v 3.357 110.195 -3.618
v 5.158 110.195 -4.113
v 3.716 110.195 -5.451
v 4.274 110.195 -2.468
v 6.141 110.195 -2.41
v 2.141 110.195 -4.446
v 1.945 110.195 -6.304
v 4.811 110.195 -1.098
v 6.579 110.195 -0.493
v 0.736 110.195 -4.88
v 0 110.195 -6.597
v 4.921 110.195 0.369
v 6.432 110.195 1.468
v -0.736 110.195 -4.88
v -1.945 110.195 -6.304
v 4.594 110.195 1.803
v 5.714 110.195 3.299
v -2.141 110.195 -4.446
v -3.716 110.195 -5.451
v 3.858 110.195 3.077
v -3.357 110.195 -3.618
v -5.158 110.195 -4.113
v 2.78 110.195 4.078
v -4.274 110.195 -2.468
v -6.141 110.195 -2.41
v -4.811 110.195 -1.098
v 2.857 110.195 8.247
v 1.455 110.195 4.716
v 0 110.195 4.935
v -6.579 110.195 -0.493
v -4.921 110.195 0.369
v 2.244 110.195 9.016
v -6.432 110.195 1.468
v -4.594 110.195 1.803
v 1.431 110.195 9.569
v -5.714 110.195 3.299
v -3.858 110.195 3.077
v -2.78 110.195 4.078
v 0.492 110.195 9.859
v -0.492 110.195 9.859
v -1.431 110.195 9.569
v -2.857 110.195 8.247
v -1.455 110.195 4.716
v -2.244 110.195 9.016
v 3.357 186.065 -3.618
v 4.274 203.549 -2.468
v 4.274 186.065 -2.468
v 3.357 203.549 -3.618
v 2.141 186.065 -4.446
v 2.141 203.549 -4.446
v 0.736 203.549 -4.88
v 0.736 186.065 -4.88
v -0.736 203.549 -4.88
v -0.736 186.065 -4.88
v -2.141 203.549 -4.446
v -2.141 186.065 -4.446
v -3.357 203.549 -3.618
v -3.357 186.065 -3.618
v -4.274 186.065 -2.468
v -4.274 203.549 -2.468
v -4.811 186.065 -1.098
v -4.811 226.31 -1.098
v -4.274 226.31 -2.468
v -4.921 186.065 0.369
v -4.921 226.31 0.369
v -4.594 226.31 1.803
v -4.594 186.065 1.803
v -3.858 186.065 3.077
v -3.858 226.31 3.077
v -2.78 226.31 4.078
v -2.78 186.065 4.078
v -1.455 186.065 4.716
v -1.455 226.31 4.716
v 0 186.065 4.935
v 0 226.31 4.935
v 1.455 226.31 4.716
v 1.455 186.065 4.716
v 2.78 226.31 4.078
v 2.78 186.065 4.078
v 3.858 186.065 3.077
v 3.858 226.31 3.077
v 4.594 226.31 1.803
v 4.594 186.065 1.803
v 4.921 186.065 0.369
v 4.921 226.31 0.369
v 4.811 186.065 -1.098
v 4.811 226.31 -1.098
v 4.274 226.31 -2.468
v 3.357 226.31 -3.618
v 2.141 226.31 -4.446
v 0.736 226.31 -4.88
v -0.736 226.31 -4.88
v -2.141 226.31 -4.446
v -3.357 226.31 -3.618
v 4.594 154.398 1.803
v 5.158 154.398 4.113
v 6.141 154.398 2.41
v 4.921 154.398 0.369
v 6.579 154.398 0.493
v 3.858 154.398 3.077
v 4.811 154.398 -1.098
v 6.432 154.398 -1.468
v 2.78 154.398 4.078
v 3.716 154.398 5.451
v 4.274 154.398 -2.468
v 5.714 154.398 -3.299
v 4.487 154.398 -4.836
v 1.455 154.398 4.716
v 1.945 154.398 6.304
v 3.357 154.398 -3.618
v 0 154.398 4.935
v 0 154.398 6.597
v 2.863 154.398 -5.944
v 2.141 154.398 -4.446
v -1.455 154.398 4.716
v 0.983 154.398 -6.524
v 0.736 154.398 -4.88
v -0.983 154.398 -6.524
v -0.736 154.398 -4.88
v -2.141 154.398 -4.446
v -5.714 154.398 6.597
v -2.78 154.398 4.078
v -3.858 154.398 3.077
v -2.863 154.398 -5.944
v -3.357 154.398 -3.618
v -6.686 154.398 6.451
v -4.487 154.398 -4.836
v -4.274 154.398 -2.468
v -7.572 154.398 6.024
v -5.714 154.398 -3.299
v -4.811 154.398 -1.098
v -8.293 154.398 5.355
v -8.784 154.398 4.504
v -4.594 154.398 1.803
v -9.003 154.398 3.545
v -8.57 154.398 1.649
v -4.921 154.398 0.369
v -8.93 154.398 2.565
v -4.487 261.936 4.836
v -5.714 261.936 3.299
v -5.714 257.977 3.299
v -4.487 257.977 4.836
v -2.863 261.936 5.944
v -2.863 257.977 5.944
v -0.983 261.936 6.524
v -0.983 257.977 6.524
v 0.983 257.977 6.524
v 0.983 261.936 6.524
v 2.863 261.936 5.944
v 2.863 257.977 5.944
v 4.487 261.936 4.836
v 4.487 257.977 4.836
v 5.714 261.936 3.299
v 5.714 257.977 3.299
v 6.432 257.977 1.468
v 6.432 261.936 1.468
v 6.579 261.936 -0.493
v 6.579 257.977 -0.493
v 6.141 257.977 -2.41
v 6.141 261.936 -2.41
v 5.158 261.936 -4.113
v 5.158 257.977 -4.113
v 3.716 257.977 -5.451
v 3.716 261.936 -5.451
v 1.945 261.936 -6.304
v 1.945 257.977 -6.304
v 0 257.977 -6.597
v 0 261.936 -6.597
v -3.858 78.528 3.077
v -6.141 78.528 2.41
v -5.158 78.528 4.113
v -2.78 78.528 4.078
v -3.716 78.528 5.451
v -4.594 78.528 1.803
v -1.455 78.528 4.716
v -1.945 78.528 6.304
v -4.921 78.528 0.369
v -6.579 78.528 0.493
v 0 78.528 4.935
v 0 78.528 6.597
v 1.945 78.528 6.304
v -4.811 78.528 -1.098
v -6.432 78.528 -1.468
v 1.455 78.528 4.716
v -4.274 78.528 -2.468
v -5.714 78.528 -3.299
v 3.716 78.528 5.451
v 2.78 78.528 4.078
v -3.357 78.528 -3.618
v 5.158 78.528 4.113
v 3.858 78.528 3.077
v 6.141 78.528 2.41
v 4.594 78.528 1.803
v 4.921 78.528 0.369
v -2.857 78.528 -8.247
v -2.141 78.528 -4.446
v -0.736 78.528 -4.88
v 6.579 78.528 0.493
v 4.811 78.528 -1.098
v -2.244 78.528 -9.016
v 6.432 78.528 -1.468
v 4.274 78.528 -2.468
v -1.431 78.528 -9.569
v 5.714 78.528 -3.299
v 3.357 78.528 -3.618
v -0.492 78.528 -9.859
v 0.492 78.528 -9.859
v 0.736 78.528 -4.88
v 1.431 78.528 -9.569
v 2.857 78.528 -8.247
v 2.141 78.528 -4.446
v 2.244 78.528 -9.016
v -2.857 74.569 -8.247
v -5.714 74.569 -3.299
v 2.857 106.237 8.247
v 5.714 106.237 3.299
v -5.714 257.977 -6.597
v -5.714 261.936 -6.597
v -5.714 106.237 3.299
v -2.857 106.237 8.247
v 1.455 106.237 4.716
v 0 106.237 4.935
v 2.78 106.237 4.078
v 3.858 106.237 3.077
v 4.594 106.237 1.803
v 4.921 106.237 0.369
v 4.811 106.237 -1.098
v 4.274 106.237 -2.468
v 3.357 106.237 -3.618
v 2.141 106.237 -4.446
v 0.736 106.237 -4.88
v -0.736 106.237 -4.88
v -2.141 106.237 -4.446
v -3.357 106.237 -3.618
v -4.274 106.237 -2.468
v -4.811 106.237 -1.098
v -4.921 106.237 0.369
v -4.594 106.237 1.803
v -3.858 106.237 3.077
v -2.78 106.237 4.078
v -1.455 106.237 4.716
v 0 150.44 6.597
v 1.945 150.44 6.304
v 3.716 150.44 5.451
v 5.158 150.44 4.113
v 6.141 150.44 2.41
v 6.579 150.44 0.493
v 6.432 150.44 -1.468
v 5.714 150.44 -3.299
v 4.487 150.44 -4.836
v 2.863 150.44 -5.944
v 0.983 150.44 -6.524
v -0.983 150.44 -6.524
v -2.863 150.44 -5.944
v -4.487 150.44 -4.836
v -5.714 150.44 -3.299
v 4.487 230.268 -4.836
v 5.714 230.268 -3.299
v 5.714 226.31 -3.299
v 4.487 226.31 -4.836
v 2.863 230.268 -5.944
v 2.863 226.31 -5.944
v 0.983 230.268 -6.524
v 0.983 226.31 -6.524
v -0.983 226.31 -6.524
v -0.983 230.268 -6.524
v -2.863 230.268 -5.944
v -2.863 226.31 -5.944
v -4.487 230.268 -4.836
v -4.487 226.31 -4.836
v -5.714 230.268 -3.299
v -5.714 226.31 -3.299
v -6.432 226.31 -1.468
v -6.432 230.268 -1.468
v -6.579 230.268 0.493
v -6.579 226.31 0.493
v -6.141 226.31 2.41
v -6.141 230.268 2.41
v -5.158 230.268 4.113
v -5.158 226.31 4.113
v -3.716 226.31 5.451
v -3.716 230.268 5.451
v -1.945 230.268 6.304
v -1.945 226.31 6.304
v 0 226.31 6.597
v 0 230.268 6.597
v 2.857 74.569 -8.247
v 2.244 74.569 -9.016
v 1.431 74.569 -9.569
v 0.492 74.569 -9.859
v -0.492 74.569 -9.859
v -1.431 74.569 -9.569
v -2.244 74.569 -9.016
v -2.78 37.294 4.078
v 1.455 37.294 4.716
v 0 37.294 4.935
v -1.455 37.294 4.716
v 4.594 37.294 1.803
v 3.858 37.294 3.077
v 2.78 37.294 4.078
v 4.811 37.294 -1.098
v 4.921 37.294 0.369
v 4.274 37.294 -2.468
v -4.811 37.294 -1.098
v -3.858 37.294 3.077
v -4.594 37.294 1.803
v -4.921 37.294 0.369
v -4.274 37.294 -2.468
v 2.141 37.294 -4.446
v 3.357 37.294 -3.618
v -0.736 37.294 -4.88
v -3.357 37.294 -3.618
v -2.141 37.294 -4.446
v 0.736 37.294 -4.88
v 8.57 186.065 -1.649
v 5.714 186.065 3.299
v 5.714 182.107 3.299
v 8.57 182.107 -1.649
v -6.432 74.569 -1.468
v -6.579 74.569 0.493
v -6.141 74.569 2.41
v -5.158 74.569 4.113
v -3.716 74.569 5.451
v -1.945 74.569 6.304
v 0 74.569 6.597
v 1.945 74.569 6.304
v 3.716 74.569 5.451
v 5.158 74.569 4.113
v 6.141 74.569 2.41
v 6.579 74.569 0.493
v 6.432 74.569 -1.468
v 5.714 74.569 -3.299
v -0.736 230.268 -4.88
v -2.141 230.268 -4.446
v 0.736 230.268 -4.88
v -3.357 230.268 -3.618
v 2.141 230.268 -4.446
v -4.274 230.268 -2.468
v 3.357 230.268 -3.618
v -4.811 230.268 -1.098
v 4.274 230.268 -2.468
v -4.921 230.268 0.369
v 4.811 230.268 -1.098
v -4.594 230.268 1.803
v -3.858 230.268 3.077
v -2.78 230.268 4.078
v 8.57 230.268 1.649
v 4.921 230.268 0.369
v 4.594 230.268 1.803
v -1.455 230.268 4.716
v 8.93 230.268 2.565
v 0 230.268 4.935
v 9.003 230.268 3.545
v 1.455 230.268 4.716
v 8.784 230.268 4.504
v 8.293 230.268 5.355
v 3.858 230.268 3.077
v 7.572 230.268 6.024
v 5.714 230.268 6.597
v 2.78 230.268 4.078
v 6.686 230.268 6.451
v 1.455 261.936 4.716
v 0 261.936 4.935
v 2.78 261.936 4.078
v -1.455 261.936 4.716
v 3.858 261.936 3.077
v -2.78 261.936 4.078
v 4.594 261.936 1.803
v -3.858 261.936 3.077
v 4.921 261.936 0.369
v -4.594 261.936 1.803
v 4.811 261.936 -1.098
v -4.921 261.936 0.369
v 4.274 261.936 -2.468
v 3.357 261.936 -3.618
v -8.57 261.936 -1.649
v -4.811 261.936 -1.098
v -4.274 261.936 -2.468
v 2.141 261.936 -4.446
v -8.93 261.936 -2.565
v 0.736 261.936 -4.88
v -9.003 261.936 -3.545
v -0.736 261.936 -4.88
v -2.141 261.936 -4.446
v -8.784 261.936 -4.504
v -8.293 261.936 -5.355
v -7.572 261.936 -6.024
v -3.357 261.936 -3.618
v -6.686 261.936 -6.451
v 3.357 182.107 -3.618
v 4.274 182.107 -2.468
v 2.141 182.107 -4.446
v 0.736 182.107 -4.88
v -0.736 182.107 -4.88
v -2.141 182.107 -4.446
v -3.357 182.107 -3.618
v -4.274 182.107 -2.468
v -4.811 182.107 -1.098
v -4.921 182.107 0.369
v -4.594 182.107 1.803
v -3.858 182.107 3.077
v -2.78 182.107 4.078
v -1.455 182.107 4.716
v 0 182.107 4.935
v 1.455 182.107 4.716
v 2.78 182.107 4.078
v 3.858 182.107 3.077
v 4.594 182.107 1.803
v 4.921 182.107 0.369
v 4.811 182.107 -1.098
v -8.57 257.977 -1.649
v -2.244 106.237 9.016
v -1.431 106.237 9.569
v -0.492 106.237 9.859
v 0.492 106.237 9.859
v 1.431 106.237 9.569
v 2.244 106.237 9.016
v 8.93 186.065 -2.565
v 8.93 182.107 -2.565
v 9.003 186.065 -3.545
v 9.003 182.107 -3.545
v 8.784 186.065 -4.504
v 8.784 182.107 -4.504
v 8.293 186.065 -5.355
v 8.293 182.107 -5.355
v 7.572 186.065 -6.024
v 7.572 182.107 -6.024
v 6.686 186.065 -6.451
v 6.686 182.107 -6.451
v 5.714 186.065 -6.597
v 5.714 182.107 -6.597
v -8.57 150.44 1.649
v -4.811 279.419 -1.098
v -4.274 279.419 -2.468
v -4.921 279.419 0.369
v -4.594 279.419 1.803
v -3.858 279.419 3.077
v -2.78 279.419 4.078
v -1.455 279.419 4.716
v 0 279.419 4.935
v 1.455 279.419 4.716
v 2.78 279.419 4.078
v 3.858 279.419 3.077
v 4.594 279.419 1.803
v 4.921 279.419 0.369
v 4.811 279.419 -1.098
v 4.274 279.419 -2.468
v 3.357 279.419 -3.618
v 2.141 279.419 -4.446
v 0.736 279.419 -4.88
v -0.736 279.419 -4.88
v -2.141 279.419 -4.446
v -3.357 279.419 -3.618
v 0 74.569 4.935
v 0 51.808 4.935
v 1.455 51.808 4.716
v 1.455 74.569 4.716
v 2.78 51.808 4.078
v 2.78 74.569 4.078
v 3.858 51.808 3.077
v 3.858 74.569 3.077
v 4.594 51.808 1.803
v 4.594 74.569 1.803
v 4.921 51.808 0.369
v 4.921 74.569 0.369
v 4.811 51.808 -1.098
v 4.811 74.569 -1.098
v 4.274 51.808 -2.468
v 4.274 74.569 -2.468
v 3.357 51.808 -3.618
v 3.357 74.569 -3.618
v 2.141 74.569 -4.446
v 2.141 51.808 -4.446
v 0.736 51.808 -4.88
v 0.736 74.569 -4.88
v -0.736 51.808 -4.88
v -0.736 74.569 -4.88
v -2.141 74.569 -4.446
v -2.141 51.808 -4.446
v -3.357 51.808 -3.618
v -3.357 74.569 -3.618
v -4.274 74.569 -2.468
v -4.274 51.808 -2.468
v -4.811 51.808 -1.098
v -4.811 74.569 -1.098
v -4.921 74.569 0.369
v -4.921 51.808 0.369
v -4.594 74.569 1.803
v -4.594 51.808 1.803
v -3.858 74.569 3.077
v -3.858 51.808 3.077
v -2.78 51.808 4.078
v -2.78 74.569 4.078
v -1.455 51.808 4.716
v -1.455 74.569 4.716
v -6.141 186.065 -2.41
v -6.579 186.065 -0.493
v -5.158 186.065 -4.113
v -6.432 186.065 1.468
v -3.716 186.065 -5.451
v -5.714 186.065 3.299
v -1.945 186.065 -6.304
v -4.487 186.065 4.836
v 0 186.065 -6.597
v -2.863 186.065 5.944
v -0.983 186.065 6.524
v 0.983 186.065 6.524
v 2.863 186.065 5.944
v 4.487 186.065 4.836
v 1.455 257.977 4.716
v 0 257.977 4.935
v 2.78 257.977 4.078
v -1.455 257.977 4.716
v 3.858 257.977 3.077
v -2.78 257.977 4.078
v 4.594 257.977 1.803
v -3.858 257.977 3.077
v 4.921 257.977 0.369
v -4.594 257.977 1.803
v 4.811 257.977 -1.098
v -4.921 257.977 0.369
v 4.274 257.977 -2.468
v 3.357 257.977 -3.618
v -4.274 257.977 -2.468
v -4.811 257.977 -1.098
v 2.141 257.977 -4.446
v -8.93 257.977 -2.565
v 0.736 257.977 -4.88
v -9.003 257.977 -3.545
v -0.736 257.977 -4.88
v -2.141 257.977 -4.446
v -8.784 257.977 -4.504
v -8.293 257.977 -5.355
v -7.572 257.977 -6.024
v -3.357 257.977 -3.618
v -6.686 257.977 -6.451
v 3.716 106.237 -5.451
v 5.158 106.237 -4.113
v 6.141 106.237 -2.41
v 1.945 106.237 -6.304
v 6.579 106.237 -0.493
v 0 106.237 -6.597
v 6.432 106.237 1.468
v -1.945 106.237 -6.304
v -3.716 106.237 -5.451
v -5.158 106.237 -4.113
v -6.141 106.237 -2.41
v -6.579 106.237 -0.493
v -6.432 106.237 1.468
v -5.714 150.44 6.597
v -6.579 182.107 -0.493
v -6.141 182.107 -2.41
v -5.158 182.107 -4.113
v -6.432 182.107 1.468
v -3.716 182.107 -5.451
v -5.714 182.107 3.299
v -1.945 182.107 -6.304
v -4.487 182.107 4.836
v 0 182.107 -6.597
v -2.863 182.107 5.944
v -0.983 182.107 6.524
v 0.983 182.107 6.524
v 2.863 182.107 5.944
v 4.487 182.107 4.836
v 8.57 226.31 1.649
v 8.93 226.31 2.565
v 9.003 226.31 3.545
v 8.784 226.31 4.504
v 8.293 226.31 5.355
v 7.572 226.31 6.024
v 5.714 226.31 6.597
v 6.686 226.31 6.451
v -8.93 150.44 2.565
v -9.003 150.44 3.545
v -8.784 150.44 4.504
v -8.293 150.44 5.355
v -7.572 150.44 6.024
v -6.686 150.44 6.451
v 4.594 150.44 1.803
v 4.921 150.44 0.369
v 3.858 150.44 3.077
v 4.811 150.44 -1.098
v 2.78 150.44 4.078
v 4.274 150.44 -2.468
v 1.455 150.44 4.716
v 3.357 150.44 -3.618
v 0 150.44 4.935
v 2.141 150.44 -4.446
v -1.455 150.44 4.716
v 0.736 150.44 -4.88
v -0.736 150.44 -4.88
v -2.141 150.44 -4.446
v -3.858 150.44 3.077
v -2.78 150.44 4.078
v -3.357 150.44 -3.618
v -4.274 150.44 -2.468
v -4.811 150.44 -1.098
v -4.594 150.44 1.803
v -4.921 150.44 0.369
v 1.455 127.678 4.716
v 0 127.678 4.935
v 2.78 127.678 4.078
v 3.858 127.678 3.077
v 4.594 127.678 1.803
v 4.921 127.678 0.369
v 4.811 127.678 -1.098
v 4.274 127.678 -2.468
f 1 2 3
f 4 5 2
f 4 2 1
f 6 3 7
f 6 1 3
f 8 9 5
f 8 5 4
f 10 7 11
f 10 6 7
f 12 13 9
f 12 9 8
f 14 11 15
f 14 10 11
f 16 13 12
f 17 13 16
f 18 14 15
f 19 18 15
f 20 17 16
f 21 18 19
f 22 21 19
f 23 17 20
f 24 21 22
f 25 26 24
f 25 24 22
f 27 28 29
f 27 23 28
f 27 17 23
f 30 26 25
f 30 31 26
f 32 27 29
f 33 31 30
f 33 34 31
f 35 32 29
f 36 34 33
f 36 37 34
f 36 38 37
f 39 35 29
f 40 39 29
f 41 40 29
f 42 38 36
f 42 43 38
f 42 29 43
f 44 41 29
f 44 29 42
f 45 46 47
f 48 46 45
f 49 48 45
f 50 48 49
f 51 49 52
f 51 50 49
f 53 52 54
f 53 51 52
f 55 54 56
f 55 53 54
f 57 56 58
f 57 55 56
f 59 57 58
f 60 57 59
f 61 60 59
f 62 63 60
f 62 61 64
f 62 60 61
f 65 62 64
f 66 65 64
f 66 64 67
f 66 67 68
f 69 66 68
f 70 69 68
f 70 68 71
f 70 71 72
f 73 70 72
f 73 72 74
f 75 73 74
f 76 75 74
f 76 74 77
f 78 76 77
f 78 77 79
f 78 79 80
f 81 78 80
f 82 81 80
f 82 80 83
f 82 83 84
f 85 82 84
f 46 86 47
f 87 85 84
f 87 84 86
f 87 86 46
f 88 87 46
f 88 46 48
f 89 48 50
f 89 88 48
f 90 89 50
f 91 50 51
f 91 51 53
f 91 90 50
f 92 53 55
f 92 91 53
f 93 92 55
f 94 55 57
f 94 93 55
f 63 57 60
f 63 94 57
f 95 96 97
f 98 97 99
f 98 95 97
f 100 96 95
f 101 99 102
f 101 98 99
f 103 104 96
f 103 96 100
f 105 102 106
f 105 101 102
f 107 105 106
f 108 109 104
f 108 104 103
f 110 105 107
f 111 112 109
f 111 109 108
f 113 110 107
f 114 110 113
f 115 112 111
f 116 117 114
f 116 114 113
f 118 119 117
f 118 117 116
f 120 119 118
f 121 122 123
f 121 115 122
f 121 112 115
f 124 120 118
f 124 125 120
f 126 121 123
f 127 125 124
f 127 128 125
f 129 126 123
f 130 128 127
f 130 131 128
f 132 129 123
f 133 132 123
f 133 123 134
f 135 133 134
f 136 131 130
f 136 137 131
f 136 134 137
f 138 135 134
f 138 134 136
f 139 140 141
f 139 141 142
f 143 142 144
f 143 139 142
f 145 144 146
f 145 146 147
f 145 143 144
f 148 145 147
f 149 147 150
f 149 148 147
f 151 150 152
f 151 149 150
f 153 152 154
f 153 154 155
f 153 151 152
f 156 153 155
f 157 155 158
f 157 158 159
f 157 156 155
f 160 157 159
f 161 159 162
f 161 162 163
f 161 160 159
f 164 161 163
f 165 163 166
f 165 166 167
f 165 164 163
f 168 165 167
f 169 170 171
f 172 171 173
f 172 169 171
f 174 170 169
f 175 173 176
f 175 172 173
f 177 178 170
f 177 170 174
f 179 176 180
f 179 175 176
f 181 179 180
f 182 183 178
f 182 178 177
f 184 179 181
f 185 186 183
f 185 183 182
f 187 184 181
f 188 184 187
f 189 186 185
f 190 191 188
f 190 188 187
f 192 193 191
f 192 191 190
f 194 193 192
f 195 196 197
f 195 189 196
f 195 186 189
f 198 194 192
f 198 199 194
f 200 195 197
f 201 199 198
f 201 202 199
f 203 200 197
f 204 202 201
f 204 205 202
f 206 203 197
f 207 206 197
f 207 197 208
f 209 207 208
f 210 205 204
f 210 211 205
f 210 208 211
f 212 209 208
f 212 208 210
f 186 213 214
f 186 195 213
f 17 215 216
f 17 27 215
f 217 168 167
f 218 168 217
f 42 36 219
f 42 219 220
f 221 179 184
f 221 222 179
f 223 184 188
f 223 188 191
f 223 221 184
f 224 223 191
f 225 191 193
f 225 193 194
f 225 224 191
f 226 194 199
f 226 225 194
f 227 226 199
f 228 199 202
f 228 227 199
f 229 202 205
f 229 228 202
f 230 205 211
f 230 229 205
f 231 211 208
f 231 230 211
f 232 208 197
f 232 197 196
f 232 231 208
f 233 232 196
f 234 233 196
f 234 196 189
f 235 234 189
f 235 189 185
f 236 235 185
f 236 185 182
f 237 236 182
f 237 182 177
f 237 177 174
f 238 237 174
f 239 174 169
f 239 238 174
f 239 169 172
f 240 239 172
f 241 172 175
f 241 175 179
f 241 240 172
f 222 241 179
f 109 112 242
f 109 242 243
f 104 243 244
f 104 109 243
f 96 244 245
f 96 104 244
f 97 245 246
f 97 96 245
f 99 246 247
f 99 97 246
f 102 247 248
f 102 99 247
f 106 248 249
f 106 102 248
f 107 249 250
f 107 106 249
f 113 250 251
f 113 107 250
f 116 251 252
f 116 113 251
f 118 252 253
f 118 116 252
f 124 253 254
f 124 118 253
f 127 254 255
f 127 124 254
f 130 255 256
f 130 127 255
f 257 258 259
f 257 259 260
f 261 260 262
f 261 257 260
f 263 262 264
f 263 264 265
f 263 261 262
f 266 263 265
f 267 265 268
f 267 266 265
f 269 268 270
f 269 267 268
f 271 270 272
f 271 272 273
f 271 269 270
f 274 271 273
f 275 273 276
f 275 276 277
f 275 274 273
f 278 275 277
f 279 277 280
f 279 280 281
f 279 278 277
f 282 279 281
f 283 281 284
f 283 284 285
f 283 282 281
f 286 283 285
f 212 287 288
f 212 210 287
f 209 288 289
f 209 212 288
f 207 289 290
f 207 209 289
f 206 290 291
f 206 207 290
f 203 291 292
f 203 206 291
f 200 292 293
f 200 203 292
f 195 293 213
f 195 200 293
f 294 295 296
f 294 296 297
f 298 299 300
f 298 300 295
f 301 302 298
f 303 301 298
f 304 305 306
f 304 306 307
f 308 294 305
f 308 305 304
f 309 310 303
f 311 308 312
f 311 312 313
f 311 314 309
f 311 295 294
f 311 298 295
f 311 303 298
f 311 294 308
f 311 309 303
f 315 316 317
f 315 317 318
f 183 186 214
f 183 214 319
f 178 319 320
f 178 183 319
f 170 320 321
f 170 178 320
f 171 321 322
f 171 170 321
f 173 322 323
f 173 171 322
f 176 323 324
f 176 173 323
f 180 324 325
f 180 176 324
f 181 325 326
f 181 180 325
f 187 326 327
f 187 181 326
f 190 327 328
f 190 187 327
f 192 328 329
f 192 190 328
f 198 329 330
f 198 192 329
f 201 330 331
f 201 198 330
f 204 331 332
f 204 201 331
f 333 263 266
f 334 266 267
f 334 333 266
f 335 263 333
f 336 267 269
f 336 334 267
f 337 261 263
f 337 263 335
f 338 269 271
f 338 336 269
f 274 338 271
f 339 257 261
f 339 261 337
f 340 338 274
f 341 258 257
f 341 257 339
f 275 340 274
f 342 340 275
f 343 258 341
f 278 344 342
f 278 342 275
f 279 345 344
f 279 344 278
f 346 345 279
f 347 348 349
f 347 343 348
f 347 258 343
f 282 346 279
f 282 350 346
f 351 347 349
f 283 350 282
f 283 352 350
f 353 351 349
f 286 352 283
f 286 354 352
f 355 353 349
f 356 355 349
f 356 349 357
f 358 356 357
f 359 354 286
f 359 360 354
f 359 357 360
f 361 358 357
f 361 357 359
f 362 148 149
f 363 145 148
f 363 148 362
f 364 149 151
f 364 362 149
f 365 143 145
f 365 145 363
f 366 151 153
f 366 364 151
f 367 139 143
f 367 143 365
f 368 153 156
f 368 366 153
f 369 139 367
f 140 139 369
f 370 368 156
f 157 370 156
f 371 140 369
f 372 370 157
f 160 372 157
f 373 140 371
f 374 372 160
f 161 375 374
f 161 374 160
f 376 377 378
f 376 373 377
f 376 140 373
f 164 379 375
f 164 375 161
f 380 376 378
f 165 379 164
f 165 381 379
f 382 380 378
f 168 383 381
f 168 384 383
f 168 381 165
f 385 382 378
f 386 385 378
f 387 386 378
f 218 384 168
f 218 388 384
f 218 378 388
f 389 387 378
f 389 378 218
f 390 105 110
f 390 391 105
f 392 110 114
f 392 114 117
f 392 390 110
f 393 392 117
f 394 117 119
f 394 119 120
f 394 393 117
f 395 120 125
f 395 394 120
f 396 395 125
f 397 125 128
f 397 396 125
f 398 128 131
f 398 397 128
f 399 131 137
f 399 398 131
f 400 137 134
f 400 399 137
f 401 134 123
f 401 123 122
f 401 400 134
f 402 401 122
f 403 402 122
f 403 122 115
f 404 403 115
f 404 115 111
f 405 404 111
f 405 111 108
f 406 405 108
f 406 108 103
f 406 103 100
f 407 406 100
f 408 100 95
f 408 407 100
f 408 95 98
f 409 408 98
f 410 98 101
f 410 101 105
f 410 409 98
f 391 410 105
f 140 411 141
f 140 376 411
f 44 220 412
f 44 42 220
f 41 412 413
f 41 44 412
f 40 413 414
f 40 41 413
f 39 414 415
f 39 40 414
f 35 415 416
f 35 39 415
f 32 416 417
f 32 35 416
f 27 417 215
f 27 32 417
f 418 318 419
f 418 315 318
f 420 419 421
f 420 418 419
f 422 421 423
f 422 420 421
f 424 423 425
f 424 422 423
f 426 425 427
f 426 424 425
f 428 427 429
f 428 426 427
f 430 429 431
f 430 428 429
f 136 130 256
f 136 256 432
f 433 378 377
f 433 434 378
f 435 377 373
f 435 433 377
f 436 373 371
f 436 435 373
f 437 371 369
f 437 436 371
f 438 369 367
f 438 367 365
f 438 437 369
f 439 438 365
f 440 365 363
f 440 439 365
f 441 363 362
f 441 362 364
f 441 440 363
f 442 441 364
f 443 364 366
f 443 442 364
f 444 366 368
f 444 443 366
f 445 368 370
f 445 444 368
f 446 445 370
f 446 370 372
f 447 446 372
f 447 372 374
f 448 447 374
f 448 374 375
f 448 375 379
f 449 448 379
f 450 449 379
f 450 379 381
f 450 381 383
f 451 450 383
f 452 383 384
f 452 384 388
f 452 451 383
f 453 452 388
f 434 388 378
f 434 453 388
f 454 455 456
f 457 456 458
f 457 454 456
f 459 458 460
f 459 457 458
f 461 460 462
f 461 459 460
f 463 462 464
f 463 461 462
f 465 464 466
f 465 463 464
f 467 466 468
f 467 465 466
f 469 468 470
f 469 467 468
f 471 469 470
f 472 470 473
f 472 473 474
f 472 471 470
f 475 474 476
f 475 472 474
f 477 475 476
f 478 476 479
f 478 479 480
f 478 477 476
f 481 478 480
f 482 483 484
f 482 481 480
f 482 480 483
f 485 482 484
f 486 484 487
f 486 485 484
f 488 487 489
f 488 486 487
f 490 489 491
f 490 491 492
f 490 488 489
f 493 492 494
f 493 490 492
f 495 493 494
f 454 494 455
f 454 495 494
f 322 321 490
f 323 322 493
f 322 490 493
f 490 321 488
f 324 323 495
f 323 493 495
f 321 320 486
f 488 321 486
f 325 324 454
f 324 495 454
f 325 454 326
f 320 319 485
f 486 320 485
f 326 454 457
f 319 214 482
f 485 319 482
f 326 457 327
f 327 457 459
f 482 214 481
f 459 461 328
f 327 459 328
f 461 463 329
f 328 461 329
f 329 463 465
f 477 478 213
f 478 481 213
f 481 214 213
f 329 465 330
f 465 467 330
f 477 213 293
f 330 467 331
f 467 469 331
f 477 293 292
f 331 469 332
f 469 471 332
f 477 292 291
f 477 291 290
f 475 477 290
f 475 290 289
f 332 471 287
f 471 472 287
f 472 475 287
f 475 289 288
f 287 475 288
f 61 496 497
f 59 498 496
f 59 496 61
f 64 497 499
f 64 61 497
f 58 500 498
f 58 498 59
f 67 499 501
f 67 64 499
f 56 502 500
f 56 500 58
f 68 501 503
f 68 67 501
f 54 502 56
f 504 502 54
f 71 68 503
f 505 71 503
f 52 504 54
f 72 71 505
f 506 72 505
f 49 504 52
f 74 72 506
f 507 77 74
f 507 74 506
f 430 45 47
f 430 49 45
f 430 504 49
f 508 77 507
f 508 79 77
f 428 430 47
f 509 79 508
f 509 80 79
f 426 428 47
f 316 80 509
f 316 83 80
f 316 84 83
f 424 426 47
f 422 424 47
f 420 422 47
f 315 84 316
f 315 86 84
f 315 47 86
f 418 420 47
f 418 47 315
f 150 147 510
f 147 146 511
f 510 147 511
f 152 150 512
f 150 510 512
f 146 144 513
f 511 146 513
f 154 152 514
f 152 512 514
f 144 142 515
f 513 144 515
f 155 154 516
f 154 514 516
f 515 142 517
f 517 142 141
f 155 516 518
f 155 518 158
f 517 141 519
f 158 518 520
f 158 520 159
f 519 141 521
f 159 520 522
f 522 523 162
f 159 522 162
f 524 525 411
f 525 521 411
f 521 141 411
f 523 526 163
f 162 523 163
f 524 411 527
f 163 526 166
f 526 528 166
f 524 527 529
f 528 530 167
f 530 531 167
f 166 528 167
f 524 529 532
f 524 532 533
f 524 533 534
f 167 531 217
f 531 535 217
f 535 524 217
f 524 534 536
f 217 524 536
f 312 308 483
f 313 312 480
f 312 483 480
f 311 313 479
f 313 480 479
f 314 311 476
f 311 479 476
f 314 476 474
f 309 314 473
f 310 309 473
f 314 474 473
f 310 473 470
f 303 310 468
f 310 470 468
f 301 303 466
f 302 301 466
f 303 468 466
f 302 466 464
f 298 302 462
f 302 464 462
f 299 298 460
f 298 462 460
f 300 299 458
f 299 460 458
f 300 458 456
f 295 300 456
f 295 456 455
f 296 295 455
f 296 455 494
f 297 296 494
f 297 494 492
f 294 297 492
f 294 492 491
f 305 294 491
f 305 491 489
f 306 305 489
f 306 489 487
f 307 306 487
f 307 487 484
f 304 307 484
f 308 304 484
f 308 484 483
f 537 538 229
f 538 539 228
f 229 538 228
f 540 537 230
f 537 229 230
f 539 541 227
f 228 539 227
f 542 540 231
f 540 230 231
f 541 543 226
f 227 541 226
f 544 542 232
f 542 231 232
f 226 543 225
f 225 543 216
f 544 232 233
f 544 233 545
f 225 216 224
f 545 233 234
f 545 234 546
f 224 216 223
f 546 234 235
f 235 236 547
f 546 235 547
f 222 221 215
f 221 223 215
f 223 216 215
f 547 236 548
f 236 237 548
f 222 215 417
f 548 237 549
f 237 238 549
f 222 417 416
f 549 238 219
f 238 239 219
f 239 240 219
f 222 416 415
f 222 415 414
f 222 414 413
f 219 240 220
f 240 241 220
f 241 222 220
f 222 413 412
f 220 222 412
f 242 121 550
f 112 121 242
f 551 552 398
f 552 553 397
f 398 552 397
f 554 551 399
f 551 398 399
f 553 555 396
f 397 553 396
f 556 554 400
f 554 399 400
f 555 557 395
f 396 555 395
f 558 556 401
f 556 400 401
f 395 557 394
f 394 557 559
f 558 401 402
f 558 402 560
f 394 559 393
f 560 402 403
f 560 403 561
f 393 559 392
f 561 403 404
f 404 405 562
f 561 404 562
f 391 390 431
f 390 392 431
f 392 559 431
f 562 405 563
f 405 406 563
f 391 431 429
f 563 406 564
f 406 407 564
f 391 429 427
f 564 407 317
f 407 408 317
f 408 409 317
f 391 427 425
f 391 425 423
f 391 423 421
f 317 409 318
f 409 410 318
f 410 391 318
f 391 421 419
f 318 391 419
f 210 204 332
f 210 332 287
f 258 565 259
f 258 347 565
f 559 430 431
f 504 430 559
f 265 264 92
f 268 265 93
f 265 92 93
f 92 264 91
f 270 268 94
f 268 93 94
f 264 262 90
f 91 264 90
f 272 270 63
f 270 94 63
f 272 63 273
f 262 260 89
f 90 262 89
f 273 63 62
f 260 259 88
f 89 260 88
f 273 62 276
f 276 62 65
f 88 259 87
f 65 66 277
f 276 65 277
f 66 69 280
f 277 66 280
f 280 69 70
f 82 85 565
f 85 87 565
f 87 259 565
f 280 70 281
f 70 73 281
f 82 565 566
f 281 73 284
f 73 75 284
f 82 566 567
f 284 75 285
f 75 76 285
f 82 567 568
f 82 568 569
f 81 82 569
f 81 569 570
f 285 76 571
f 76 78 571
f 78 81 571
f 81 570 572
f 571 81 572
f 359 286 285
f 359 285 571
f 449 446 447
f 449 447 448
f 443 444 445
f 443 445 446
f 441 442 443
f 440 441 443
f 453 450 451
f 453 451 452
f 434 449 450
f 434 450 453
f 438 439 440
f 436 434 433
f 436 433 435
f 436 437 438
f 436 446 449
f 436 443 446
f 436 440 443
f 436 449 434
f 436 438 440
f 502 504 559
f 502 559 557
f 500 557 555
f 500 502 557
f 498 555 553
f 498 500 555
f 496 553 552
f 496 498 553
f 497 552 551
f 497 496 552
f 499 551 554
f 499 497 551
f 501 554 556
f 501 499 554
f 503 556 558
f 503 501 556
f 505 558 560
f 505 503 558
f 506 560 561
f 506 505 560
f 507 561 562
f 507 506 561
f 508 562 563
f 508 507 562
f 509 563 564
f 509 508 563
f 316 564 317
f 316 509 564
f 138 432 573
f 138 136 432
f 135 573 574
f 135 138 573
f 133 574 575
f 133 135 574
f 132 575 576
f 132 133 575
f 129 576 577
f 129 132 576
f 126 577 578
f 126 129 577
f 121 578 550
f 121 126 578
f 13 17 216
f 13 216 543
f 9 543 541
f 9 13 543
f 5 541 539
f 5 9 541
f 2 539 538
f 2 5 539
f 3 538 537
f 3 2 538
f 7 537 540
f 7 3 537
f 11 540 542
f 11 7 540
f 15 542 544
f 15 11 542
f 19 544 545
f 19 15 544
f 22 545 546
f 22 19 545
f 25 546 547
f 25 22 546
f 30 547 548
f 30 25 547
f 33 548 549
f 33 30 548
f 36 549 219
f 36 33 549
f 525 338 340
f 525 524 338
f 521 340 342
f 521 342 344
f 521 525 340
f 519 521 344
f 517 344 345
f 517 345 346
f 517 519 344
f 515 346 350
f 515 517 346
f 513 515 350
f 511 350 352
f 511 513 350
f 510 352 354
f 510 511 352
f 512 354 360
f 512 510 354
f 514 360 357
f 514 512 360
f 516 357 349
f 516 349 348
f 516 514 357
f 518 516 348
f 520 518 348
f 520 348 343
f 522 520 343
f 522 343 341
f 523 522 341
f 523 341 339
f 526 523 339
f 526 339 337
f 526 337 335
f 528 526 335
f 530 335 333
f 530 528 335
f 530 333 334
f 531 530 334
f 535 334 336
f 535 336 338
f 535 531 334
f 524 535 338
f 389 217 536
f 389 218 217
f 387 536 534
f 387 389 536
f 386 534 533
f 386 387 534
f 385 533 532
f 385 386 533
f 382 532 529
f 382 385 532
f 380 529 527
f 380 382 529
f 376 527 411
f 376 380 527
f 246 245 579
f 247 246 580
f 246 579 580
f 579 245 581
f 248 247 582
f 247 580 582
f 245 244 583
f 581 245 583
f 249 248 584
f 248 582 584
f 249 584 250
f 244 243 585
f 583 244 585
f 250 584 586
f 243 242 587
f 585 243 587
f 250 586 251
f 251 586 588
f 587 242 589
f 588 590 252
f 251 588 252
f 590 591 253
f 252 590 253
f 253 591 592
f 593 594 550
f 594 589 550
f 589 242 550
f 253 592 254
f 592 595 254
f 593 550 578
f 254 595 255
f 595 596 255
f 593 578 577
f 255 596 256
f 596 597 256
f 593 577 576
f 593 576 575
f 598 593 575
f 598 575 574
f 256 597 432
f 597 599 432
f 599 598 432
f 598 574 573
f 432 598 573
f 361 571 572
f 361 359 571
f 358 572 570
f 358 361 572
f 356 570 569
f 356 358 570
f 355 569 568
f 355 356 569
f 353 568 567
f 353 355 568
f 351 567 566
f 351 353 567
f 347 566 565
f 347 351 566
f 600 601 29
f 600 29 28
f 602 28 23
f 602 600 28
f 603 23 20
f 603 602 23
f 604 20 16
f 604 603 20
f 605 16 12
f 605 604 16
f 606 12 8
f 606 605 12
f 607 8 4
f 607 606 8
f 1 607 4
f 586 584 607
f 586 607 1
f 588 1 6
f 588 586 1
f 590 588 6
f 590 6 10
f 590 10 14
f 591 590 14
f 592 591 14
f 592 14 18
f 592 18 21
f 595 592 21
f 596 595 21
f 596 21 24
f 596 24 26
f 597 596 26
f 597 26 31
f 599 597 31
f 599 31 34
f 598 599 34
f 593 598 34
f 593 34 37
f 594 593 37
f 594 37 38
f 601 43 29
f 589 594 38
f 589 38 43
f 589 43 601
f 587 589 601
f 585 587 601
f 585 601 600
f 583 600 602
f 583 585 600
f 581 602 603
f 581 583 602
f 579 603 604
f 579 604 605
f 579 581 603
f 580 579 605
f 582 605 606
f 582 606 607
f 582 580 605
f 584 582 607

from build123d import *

# Parameters (mm, degrees)
BOSS_EXTRUDE1_DEPTH   = 3.81
BODY_MOVE_COPY2_ANGLE = 180
BOSS_EXTRUDE2_START   = 25.4
SKETCH2_R             = 9.5
BOSS_EXTRUDE2_DEPTH   = 73.025
LPATTERN1_COUNT       = 3
LPATTERN1_PITCH       = 146.05
BODY_MOVE_COPY3_ANGLE = 120
BODY_MOVE_COPY4_ANGLE = 120
SKETCH3_R             = 9.5
BOSS_EXTRUDE3_DEPTH   = 27.94
SCALE1_SCALE          = 0.51948


with BuildPart() as part:
    # Sketch1 → Boss-Extrude1 (new, symmetric)
    with BuildSketch(Plane(origin=(0, 0, 0), x_dir=(1, 0, 0), z_dir=(0, 1, 0))):
        with BuildLine():
            Line((-5.499261314, 15.875), (-10.998522628, 6.35))
            ThreePointArc((-10.998522628, 6.35), (0, -12.7), (10.998522628, 6.35))
            Line((10.998522628, 6.35), (5.499261314, 15.875))
            ThreePointArc((5.499261314, 15.875), (0, 19.05), (-5.499261314, 15.875))
        make_face()
    extrude(amount=BOSS_EXTRUDE1_DEPTH, both=True)


with BuildPart() as body_2:
    # Body-Move/Copy1: copy of part
    add(part.part.moved(Location((0, 60.96, 0))))


with BuildPart() as body_2_1:
    # Body-Move/Copy2: moved
    add(body_2.part.rotate(Axis((0, 0, 0), (0, 1, 0)), BODY_MOVE_COPY2_ANGLE))


with BuildPart() as part_1:
    add(part.part)

    add(body_2_1.part)  # Boss-Extrude2 merges body 2
    # Sketch2 → Boss-Extrude2 (add, symmetric)
    with BuildSketch(Plane(origin=(0, 0, 0), x_dir=(1, 0, 0), z_dir=(0, 1, 0)).offset(BOSS_EXTRUDE2_START)):
        Circle(SKETCH2_R)
    extrude(amount=BOSS_EXTRUDE2_DEPTH, both=True)


with BuildPart() as lpattern1_1:
    # LPattern1: pattern copy
    add(part_1.part.moved(Location(Vector(0, 1, 0) * (1 * LPATTERN1_PITCH))))


with BuildPart() as lpattern1_2:
    # LPattern1: pattern copy
    add(part_1.part.moved(Location(Vector(0, 1, 0) * (2 * LPATTERN1_PITCH))))


with BuildPart() as lpattern1_1_1:
    # Body-Move/Copy3: moved
    add(lpattern1_1.part.rotate(Axis((0, 0, 0), (0, 1, 0)), BODY_MOVE_COPY3_ANGLE))


with BuildPart() as lpattern1_2_1:
    # Body-Move/Copy4: moved
    add(lpattern1_2.part.rotate(Axis((0, 0, 0), (0, -1, 0)), BODY_MOVE_COPY4_ANGLE))


with BuildPart() as part_2:
    add(part_1.part)

    # Sketch3 → Boss-Extrude3 (add)
    with BuildSketch(Plane.XZ.offset(47.625)):
        Circle(SKETCH3_R)
    extrude(amount=BOSS_EXTRUDE3_DEPTH)

    # Combine1: union LPattern1_1, LPattern1_2
    add(lpattern1_1_1.part)
    add(lpattern1_2_1.part)


with BuildPart() as part_3:
    # Scale1: scaled about (0, 159.303825553, 0)
    add(part_2.part.scale(SCALE1_SCALE).moved(Location((0, 76.548674255, 0))))


solid = part_3.part
